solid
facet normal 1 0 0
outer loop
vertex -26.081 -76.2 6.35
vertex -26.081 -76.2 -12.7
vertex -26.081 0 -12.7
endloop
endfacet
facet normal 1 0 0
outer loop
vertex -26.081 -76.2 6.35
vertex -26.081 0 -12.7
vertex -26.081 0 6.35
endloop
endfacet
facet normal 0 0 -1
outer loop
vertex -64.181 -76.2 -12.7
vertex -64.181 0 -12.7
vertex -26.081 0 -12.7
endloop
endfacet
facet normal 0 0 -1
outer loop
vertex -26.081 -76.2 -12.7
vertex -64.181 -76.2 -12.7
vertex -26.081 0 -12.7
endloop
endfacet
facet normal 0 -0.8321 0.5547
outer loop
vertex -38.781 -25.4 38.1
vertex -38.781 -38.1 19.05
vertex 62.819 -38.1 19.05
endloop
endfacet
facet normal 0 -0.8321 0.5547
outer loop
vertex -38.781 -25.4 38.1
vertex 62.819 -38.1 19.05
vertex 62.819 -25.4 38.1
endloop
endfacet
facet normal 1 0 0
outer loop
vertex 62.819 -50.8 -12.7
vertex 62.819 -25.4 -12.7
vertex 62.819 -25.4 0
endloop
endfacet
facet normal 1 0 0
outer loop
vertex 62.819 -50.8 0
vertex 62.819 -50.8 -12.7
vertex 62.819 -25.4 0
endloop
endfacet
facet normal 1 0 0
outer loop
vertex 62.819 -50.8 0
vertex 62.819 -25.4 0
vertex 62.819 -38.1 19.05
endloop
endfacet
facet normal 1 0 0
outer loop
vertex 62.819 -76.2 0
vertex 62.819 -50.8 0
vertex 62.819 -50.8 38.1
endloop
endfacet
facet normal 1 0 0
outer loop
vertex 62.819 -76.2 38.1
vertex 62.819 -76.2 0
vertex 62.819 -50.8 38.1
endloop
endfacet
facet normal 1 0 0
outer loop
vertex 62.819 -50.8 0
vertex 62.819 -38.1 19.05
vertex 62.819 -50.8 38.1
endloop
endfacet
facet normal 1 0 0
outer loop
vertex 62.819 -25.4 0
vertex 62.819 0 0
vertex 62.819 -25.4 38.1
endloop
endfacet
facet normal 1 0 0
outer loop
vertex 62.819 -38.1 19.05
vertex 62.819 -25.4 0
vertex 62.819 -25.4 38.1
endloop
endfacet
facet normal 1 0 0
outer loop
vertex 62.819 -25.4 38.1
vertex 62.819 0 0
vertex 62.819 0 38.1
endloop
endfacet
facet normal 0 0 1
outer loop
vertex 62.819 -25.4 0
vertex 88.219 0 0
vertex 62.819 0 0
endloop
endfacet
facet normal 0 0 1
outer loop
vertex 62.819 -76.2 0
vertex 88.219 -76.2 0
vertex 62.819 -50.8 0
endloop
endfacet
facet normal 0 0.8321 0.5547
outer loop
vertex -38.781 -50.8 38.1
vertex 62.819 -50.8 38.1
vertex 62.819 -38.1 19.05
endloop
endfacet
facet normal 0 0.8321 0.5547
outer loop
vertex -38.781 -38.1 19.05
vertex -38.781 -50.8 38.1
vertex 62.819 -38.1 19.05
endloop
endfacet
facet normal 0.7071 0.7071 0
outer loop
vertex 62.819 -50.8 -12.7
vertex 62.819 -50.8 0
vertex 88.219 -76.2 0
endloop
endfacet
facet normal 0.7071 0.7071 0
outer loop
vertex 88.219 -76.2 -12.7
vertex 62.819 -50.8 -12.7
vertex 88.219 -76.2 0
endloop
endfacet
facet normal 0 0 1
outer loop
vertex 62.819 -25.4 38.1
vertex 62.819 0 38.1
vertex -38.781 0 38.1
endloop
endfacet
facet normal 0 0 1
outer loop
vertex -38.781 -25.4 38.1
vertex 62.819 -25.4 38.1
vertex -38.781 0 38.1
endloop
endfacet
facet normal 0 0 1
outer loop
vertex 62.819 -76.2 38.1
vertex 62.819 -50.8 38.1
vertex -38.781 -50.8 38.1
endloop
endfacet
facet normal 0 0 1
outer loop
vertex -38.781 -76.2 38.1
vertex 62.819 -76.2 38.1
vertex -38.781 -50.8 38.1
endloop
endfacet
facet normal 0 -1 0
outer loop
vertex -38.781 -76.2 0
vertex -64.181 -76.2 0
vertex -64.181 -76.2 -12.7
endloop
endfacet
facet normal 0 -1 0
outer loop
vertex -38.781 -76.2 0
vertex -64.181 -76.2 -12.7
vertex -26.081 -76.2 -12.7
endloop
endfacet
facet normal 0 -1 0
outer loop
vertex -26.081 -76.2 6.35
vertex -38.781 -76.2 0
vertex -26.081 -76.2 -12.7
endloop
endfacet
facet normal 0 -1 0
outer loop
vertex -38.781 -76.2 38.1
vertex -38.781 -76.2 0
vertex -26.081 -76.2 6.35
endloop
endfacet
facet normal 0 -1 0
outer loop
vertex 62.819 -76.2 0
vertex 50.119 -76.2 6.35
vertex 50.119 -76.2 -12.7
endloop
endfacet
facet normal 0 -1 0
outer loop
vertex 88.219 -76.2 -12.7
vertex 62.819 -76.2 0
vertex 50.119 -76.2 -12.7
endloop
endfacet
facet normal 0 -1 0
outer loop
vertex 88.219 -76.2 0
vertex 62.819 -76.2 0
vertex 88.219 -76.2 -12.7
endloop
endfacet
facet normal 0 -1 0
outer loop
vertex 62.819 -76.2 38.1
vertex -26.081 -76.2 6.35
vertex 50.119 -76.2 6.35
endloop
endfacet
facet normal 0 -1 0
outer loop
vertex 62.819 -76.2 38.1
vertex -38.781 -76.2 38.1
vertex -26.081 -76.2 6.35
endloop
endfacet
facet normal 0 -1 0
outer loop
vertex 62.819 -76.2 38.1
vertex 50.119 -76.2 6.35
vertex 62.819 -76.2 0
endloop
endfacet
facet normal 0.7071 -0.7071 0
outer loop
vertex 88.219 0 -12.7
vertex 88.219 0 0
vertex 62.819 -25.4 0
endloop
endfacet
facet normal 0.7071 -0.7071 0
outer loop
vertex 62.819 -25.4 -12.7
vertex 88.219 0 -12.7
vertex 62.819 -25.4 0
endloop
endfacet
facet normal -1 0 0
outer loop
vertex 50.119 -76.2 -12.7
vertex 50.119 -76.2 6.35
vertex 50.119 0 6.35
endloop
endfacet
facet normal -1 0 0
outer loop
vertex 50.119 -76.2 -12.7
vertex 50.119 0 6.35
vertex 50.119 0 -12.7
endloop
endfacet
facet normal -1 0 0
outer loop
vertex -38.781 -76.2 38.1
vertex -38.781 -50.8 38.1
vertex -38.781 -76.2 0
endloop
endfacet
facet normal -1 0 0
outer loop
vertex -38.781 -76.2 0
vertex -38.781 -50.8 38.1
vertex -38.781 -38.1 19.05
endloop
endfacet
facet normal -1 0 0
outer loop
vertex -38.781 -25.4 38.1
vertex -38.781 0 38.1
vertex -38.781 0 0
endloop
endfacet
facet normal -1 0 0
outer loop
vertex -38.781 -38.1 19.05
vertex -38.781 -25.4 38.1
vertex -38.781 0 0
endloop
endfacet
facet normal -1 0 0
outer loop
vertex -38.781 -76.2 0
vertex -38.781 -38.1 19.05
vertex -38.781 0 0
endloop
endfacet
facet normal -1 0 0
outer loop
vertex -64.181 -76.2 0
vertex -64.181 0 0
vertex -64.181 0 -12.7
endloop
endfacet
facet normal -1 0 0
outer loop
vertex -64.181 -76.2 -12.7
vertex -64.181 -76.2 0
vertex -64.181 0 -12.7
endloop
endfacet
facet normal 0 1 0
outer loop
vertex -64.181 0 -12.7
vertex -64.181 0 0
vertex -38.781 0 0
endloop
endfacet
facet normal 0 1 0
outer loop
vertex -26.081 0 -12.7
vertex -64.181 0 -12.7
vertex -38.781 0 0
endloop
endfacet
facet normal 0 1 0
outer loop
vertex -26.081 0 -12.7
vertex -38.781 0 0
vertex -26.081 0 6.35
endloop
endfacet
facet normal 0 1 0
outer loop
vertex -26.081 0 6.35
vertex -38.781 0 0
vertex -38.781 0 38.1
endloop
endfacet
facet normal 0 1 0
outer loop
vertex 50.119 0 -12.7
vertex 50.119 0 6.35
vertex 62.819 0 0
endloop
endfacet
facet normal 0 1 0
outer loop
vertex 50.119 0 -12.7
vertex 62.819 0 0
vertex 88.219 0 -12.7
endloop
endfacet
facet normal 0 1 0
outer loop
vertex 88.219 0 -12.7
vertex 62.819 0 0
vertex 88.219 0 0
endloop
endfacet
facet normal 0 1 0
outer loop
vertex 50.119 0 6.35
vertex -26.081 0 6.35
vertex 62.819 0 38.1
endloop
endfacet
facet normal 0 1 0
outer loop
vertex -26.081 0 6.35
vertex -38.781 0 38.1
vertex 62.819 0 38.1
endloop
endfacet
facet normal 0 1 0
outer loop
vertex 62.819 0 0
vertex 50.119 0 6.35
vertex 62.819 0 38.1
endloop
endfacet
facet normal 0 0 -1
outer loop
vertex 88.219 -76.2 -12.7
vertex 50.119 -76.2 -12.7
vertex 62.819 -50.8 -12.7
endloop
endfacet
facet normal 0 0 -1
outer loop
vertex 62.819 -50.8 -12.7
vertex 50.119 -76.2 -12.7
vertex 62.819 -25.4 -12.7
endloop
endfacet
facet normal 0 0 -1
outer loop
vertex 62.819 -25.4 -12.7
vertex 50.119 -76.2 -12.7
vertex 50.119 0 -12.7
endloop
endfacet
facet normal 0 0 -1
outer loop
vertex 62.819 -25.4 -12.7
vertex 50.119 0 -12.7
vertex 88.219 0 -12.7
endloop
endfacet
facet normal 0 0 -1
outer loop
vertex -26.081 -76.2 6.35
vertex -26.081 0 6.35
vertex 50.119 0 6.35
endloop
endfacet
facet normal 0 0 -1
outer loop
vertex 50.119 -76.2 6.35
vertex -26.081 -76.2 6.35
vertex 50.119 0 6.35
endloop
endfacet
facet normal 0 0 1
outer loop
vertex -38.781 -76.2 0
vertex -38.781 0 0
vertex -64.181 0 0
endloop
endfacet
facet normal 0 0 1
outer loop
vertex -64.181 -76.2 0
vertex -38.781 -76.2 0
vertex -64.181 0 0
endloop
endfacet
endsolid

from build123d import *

# Parameters (mm, degrees)
F1_DEPTH = 76.2
F3_DEPTH = 12.7
F5_DEPTH = 152.4


with BuildPart() as f1:
    # F0 (on Front) → F1 (new body)
    with BuildSketch(Plane.XZ):
        Polygon((-38.780687, 0), (-64.180687, 0), (-64.180687, -12.7), (-26.080687, -12.7), (-26.080687, 6.35), (50.119313, 6.35), (50.119313, -12.7), (88.219313, -12.7), (88.219313, 0), (62.819313, 0), (62.819313, 38.1), (50.119313, 38.1), (-38.780687, 38.1), align=None)
    extrude(amount=F1_DEPTH)

    # F2 (on face) → F3 (cut)
    with BuildSketch(Plane.XY):
        Polygon((62.819313, -25.4), (62.819313, -50.8), (88.219313, -76.2), (88.219313, 0), align=None)
    extrude(amount=-F3_DEPTH, mode=Mode.SUBTRACT)

    # F4 (on face) → F5 (cut)
    with BuildSketch(Plane.YZ.offset(62.819313)):
        Polygon((-25.4, 38.1), (-50.8, 38.1), (-38.1, 19.05), align=None)
    extrude(amount=-F5_DEPTH, mode=Mode.SUBTRACT)


solid = f1.part
